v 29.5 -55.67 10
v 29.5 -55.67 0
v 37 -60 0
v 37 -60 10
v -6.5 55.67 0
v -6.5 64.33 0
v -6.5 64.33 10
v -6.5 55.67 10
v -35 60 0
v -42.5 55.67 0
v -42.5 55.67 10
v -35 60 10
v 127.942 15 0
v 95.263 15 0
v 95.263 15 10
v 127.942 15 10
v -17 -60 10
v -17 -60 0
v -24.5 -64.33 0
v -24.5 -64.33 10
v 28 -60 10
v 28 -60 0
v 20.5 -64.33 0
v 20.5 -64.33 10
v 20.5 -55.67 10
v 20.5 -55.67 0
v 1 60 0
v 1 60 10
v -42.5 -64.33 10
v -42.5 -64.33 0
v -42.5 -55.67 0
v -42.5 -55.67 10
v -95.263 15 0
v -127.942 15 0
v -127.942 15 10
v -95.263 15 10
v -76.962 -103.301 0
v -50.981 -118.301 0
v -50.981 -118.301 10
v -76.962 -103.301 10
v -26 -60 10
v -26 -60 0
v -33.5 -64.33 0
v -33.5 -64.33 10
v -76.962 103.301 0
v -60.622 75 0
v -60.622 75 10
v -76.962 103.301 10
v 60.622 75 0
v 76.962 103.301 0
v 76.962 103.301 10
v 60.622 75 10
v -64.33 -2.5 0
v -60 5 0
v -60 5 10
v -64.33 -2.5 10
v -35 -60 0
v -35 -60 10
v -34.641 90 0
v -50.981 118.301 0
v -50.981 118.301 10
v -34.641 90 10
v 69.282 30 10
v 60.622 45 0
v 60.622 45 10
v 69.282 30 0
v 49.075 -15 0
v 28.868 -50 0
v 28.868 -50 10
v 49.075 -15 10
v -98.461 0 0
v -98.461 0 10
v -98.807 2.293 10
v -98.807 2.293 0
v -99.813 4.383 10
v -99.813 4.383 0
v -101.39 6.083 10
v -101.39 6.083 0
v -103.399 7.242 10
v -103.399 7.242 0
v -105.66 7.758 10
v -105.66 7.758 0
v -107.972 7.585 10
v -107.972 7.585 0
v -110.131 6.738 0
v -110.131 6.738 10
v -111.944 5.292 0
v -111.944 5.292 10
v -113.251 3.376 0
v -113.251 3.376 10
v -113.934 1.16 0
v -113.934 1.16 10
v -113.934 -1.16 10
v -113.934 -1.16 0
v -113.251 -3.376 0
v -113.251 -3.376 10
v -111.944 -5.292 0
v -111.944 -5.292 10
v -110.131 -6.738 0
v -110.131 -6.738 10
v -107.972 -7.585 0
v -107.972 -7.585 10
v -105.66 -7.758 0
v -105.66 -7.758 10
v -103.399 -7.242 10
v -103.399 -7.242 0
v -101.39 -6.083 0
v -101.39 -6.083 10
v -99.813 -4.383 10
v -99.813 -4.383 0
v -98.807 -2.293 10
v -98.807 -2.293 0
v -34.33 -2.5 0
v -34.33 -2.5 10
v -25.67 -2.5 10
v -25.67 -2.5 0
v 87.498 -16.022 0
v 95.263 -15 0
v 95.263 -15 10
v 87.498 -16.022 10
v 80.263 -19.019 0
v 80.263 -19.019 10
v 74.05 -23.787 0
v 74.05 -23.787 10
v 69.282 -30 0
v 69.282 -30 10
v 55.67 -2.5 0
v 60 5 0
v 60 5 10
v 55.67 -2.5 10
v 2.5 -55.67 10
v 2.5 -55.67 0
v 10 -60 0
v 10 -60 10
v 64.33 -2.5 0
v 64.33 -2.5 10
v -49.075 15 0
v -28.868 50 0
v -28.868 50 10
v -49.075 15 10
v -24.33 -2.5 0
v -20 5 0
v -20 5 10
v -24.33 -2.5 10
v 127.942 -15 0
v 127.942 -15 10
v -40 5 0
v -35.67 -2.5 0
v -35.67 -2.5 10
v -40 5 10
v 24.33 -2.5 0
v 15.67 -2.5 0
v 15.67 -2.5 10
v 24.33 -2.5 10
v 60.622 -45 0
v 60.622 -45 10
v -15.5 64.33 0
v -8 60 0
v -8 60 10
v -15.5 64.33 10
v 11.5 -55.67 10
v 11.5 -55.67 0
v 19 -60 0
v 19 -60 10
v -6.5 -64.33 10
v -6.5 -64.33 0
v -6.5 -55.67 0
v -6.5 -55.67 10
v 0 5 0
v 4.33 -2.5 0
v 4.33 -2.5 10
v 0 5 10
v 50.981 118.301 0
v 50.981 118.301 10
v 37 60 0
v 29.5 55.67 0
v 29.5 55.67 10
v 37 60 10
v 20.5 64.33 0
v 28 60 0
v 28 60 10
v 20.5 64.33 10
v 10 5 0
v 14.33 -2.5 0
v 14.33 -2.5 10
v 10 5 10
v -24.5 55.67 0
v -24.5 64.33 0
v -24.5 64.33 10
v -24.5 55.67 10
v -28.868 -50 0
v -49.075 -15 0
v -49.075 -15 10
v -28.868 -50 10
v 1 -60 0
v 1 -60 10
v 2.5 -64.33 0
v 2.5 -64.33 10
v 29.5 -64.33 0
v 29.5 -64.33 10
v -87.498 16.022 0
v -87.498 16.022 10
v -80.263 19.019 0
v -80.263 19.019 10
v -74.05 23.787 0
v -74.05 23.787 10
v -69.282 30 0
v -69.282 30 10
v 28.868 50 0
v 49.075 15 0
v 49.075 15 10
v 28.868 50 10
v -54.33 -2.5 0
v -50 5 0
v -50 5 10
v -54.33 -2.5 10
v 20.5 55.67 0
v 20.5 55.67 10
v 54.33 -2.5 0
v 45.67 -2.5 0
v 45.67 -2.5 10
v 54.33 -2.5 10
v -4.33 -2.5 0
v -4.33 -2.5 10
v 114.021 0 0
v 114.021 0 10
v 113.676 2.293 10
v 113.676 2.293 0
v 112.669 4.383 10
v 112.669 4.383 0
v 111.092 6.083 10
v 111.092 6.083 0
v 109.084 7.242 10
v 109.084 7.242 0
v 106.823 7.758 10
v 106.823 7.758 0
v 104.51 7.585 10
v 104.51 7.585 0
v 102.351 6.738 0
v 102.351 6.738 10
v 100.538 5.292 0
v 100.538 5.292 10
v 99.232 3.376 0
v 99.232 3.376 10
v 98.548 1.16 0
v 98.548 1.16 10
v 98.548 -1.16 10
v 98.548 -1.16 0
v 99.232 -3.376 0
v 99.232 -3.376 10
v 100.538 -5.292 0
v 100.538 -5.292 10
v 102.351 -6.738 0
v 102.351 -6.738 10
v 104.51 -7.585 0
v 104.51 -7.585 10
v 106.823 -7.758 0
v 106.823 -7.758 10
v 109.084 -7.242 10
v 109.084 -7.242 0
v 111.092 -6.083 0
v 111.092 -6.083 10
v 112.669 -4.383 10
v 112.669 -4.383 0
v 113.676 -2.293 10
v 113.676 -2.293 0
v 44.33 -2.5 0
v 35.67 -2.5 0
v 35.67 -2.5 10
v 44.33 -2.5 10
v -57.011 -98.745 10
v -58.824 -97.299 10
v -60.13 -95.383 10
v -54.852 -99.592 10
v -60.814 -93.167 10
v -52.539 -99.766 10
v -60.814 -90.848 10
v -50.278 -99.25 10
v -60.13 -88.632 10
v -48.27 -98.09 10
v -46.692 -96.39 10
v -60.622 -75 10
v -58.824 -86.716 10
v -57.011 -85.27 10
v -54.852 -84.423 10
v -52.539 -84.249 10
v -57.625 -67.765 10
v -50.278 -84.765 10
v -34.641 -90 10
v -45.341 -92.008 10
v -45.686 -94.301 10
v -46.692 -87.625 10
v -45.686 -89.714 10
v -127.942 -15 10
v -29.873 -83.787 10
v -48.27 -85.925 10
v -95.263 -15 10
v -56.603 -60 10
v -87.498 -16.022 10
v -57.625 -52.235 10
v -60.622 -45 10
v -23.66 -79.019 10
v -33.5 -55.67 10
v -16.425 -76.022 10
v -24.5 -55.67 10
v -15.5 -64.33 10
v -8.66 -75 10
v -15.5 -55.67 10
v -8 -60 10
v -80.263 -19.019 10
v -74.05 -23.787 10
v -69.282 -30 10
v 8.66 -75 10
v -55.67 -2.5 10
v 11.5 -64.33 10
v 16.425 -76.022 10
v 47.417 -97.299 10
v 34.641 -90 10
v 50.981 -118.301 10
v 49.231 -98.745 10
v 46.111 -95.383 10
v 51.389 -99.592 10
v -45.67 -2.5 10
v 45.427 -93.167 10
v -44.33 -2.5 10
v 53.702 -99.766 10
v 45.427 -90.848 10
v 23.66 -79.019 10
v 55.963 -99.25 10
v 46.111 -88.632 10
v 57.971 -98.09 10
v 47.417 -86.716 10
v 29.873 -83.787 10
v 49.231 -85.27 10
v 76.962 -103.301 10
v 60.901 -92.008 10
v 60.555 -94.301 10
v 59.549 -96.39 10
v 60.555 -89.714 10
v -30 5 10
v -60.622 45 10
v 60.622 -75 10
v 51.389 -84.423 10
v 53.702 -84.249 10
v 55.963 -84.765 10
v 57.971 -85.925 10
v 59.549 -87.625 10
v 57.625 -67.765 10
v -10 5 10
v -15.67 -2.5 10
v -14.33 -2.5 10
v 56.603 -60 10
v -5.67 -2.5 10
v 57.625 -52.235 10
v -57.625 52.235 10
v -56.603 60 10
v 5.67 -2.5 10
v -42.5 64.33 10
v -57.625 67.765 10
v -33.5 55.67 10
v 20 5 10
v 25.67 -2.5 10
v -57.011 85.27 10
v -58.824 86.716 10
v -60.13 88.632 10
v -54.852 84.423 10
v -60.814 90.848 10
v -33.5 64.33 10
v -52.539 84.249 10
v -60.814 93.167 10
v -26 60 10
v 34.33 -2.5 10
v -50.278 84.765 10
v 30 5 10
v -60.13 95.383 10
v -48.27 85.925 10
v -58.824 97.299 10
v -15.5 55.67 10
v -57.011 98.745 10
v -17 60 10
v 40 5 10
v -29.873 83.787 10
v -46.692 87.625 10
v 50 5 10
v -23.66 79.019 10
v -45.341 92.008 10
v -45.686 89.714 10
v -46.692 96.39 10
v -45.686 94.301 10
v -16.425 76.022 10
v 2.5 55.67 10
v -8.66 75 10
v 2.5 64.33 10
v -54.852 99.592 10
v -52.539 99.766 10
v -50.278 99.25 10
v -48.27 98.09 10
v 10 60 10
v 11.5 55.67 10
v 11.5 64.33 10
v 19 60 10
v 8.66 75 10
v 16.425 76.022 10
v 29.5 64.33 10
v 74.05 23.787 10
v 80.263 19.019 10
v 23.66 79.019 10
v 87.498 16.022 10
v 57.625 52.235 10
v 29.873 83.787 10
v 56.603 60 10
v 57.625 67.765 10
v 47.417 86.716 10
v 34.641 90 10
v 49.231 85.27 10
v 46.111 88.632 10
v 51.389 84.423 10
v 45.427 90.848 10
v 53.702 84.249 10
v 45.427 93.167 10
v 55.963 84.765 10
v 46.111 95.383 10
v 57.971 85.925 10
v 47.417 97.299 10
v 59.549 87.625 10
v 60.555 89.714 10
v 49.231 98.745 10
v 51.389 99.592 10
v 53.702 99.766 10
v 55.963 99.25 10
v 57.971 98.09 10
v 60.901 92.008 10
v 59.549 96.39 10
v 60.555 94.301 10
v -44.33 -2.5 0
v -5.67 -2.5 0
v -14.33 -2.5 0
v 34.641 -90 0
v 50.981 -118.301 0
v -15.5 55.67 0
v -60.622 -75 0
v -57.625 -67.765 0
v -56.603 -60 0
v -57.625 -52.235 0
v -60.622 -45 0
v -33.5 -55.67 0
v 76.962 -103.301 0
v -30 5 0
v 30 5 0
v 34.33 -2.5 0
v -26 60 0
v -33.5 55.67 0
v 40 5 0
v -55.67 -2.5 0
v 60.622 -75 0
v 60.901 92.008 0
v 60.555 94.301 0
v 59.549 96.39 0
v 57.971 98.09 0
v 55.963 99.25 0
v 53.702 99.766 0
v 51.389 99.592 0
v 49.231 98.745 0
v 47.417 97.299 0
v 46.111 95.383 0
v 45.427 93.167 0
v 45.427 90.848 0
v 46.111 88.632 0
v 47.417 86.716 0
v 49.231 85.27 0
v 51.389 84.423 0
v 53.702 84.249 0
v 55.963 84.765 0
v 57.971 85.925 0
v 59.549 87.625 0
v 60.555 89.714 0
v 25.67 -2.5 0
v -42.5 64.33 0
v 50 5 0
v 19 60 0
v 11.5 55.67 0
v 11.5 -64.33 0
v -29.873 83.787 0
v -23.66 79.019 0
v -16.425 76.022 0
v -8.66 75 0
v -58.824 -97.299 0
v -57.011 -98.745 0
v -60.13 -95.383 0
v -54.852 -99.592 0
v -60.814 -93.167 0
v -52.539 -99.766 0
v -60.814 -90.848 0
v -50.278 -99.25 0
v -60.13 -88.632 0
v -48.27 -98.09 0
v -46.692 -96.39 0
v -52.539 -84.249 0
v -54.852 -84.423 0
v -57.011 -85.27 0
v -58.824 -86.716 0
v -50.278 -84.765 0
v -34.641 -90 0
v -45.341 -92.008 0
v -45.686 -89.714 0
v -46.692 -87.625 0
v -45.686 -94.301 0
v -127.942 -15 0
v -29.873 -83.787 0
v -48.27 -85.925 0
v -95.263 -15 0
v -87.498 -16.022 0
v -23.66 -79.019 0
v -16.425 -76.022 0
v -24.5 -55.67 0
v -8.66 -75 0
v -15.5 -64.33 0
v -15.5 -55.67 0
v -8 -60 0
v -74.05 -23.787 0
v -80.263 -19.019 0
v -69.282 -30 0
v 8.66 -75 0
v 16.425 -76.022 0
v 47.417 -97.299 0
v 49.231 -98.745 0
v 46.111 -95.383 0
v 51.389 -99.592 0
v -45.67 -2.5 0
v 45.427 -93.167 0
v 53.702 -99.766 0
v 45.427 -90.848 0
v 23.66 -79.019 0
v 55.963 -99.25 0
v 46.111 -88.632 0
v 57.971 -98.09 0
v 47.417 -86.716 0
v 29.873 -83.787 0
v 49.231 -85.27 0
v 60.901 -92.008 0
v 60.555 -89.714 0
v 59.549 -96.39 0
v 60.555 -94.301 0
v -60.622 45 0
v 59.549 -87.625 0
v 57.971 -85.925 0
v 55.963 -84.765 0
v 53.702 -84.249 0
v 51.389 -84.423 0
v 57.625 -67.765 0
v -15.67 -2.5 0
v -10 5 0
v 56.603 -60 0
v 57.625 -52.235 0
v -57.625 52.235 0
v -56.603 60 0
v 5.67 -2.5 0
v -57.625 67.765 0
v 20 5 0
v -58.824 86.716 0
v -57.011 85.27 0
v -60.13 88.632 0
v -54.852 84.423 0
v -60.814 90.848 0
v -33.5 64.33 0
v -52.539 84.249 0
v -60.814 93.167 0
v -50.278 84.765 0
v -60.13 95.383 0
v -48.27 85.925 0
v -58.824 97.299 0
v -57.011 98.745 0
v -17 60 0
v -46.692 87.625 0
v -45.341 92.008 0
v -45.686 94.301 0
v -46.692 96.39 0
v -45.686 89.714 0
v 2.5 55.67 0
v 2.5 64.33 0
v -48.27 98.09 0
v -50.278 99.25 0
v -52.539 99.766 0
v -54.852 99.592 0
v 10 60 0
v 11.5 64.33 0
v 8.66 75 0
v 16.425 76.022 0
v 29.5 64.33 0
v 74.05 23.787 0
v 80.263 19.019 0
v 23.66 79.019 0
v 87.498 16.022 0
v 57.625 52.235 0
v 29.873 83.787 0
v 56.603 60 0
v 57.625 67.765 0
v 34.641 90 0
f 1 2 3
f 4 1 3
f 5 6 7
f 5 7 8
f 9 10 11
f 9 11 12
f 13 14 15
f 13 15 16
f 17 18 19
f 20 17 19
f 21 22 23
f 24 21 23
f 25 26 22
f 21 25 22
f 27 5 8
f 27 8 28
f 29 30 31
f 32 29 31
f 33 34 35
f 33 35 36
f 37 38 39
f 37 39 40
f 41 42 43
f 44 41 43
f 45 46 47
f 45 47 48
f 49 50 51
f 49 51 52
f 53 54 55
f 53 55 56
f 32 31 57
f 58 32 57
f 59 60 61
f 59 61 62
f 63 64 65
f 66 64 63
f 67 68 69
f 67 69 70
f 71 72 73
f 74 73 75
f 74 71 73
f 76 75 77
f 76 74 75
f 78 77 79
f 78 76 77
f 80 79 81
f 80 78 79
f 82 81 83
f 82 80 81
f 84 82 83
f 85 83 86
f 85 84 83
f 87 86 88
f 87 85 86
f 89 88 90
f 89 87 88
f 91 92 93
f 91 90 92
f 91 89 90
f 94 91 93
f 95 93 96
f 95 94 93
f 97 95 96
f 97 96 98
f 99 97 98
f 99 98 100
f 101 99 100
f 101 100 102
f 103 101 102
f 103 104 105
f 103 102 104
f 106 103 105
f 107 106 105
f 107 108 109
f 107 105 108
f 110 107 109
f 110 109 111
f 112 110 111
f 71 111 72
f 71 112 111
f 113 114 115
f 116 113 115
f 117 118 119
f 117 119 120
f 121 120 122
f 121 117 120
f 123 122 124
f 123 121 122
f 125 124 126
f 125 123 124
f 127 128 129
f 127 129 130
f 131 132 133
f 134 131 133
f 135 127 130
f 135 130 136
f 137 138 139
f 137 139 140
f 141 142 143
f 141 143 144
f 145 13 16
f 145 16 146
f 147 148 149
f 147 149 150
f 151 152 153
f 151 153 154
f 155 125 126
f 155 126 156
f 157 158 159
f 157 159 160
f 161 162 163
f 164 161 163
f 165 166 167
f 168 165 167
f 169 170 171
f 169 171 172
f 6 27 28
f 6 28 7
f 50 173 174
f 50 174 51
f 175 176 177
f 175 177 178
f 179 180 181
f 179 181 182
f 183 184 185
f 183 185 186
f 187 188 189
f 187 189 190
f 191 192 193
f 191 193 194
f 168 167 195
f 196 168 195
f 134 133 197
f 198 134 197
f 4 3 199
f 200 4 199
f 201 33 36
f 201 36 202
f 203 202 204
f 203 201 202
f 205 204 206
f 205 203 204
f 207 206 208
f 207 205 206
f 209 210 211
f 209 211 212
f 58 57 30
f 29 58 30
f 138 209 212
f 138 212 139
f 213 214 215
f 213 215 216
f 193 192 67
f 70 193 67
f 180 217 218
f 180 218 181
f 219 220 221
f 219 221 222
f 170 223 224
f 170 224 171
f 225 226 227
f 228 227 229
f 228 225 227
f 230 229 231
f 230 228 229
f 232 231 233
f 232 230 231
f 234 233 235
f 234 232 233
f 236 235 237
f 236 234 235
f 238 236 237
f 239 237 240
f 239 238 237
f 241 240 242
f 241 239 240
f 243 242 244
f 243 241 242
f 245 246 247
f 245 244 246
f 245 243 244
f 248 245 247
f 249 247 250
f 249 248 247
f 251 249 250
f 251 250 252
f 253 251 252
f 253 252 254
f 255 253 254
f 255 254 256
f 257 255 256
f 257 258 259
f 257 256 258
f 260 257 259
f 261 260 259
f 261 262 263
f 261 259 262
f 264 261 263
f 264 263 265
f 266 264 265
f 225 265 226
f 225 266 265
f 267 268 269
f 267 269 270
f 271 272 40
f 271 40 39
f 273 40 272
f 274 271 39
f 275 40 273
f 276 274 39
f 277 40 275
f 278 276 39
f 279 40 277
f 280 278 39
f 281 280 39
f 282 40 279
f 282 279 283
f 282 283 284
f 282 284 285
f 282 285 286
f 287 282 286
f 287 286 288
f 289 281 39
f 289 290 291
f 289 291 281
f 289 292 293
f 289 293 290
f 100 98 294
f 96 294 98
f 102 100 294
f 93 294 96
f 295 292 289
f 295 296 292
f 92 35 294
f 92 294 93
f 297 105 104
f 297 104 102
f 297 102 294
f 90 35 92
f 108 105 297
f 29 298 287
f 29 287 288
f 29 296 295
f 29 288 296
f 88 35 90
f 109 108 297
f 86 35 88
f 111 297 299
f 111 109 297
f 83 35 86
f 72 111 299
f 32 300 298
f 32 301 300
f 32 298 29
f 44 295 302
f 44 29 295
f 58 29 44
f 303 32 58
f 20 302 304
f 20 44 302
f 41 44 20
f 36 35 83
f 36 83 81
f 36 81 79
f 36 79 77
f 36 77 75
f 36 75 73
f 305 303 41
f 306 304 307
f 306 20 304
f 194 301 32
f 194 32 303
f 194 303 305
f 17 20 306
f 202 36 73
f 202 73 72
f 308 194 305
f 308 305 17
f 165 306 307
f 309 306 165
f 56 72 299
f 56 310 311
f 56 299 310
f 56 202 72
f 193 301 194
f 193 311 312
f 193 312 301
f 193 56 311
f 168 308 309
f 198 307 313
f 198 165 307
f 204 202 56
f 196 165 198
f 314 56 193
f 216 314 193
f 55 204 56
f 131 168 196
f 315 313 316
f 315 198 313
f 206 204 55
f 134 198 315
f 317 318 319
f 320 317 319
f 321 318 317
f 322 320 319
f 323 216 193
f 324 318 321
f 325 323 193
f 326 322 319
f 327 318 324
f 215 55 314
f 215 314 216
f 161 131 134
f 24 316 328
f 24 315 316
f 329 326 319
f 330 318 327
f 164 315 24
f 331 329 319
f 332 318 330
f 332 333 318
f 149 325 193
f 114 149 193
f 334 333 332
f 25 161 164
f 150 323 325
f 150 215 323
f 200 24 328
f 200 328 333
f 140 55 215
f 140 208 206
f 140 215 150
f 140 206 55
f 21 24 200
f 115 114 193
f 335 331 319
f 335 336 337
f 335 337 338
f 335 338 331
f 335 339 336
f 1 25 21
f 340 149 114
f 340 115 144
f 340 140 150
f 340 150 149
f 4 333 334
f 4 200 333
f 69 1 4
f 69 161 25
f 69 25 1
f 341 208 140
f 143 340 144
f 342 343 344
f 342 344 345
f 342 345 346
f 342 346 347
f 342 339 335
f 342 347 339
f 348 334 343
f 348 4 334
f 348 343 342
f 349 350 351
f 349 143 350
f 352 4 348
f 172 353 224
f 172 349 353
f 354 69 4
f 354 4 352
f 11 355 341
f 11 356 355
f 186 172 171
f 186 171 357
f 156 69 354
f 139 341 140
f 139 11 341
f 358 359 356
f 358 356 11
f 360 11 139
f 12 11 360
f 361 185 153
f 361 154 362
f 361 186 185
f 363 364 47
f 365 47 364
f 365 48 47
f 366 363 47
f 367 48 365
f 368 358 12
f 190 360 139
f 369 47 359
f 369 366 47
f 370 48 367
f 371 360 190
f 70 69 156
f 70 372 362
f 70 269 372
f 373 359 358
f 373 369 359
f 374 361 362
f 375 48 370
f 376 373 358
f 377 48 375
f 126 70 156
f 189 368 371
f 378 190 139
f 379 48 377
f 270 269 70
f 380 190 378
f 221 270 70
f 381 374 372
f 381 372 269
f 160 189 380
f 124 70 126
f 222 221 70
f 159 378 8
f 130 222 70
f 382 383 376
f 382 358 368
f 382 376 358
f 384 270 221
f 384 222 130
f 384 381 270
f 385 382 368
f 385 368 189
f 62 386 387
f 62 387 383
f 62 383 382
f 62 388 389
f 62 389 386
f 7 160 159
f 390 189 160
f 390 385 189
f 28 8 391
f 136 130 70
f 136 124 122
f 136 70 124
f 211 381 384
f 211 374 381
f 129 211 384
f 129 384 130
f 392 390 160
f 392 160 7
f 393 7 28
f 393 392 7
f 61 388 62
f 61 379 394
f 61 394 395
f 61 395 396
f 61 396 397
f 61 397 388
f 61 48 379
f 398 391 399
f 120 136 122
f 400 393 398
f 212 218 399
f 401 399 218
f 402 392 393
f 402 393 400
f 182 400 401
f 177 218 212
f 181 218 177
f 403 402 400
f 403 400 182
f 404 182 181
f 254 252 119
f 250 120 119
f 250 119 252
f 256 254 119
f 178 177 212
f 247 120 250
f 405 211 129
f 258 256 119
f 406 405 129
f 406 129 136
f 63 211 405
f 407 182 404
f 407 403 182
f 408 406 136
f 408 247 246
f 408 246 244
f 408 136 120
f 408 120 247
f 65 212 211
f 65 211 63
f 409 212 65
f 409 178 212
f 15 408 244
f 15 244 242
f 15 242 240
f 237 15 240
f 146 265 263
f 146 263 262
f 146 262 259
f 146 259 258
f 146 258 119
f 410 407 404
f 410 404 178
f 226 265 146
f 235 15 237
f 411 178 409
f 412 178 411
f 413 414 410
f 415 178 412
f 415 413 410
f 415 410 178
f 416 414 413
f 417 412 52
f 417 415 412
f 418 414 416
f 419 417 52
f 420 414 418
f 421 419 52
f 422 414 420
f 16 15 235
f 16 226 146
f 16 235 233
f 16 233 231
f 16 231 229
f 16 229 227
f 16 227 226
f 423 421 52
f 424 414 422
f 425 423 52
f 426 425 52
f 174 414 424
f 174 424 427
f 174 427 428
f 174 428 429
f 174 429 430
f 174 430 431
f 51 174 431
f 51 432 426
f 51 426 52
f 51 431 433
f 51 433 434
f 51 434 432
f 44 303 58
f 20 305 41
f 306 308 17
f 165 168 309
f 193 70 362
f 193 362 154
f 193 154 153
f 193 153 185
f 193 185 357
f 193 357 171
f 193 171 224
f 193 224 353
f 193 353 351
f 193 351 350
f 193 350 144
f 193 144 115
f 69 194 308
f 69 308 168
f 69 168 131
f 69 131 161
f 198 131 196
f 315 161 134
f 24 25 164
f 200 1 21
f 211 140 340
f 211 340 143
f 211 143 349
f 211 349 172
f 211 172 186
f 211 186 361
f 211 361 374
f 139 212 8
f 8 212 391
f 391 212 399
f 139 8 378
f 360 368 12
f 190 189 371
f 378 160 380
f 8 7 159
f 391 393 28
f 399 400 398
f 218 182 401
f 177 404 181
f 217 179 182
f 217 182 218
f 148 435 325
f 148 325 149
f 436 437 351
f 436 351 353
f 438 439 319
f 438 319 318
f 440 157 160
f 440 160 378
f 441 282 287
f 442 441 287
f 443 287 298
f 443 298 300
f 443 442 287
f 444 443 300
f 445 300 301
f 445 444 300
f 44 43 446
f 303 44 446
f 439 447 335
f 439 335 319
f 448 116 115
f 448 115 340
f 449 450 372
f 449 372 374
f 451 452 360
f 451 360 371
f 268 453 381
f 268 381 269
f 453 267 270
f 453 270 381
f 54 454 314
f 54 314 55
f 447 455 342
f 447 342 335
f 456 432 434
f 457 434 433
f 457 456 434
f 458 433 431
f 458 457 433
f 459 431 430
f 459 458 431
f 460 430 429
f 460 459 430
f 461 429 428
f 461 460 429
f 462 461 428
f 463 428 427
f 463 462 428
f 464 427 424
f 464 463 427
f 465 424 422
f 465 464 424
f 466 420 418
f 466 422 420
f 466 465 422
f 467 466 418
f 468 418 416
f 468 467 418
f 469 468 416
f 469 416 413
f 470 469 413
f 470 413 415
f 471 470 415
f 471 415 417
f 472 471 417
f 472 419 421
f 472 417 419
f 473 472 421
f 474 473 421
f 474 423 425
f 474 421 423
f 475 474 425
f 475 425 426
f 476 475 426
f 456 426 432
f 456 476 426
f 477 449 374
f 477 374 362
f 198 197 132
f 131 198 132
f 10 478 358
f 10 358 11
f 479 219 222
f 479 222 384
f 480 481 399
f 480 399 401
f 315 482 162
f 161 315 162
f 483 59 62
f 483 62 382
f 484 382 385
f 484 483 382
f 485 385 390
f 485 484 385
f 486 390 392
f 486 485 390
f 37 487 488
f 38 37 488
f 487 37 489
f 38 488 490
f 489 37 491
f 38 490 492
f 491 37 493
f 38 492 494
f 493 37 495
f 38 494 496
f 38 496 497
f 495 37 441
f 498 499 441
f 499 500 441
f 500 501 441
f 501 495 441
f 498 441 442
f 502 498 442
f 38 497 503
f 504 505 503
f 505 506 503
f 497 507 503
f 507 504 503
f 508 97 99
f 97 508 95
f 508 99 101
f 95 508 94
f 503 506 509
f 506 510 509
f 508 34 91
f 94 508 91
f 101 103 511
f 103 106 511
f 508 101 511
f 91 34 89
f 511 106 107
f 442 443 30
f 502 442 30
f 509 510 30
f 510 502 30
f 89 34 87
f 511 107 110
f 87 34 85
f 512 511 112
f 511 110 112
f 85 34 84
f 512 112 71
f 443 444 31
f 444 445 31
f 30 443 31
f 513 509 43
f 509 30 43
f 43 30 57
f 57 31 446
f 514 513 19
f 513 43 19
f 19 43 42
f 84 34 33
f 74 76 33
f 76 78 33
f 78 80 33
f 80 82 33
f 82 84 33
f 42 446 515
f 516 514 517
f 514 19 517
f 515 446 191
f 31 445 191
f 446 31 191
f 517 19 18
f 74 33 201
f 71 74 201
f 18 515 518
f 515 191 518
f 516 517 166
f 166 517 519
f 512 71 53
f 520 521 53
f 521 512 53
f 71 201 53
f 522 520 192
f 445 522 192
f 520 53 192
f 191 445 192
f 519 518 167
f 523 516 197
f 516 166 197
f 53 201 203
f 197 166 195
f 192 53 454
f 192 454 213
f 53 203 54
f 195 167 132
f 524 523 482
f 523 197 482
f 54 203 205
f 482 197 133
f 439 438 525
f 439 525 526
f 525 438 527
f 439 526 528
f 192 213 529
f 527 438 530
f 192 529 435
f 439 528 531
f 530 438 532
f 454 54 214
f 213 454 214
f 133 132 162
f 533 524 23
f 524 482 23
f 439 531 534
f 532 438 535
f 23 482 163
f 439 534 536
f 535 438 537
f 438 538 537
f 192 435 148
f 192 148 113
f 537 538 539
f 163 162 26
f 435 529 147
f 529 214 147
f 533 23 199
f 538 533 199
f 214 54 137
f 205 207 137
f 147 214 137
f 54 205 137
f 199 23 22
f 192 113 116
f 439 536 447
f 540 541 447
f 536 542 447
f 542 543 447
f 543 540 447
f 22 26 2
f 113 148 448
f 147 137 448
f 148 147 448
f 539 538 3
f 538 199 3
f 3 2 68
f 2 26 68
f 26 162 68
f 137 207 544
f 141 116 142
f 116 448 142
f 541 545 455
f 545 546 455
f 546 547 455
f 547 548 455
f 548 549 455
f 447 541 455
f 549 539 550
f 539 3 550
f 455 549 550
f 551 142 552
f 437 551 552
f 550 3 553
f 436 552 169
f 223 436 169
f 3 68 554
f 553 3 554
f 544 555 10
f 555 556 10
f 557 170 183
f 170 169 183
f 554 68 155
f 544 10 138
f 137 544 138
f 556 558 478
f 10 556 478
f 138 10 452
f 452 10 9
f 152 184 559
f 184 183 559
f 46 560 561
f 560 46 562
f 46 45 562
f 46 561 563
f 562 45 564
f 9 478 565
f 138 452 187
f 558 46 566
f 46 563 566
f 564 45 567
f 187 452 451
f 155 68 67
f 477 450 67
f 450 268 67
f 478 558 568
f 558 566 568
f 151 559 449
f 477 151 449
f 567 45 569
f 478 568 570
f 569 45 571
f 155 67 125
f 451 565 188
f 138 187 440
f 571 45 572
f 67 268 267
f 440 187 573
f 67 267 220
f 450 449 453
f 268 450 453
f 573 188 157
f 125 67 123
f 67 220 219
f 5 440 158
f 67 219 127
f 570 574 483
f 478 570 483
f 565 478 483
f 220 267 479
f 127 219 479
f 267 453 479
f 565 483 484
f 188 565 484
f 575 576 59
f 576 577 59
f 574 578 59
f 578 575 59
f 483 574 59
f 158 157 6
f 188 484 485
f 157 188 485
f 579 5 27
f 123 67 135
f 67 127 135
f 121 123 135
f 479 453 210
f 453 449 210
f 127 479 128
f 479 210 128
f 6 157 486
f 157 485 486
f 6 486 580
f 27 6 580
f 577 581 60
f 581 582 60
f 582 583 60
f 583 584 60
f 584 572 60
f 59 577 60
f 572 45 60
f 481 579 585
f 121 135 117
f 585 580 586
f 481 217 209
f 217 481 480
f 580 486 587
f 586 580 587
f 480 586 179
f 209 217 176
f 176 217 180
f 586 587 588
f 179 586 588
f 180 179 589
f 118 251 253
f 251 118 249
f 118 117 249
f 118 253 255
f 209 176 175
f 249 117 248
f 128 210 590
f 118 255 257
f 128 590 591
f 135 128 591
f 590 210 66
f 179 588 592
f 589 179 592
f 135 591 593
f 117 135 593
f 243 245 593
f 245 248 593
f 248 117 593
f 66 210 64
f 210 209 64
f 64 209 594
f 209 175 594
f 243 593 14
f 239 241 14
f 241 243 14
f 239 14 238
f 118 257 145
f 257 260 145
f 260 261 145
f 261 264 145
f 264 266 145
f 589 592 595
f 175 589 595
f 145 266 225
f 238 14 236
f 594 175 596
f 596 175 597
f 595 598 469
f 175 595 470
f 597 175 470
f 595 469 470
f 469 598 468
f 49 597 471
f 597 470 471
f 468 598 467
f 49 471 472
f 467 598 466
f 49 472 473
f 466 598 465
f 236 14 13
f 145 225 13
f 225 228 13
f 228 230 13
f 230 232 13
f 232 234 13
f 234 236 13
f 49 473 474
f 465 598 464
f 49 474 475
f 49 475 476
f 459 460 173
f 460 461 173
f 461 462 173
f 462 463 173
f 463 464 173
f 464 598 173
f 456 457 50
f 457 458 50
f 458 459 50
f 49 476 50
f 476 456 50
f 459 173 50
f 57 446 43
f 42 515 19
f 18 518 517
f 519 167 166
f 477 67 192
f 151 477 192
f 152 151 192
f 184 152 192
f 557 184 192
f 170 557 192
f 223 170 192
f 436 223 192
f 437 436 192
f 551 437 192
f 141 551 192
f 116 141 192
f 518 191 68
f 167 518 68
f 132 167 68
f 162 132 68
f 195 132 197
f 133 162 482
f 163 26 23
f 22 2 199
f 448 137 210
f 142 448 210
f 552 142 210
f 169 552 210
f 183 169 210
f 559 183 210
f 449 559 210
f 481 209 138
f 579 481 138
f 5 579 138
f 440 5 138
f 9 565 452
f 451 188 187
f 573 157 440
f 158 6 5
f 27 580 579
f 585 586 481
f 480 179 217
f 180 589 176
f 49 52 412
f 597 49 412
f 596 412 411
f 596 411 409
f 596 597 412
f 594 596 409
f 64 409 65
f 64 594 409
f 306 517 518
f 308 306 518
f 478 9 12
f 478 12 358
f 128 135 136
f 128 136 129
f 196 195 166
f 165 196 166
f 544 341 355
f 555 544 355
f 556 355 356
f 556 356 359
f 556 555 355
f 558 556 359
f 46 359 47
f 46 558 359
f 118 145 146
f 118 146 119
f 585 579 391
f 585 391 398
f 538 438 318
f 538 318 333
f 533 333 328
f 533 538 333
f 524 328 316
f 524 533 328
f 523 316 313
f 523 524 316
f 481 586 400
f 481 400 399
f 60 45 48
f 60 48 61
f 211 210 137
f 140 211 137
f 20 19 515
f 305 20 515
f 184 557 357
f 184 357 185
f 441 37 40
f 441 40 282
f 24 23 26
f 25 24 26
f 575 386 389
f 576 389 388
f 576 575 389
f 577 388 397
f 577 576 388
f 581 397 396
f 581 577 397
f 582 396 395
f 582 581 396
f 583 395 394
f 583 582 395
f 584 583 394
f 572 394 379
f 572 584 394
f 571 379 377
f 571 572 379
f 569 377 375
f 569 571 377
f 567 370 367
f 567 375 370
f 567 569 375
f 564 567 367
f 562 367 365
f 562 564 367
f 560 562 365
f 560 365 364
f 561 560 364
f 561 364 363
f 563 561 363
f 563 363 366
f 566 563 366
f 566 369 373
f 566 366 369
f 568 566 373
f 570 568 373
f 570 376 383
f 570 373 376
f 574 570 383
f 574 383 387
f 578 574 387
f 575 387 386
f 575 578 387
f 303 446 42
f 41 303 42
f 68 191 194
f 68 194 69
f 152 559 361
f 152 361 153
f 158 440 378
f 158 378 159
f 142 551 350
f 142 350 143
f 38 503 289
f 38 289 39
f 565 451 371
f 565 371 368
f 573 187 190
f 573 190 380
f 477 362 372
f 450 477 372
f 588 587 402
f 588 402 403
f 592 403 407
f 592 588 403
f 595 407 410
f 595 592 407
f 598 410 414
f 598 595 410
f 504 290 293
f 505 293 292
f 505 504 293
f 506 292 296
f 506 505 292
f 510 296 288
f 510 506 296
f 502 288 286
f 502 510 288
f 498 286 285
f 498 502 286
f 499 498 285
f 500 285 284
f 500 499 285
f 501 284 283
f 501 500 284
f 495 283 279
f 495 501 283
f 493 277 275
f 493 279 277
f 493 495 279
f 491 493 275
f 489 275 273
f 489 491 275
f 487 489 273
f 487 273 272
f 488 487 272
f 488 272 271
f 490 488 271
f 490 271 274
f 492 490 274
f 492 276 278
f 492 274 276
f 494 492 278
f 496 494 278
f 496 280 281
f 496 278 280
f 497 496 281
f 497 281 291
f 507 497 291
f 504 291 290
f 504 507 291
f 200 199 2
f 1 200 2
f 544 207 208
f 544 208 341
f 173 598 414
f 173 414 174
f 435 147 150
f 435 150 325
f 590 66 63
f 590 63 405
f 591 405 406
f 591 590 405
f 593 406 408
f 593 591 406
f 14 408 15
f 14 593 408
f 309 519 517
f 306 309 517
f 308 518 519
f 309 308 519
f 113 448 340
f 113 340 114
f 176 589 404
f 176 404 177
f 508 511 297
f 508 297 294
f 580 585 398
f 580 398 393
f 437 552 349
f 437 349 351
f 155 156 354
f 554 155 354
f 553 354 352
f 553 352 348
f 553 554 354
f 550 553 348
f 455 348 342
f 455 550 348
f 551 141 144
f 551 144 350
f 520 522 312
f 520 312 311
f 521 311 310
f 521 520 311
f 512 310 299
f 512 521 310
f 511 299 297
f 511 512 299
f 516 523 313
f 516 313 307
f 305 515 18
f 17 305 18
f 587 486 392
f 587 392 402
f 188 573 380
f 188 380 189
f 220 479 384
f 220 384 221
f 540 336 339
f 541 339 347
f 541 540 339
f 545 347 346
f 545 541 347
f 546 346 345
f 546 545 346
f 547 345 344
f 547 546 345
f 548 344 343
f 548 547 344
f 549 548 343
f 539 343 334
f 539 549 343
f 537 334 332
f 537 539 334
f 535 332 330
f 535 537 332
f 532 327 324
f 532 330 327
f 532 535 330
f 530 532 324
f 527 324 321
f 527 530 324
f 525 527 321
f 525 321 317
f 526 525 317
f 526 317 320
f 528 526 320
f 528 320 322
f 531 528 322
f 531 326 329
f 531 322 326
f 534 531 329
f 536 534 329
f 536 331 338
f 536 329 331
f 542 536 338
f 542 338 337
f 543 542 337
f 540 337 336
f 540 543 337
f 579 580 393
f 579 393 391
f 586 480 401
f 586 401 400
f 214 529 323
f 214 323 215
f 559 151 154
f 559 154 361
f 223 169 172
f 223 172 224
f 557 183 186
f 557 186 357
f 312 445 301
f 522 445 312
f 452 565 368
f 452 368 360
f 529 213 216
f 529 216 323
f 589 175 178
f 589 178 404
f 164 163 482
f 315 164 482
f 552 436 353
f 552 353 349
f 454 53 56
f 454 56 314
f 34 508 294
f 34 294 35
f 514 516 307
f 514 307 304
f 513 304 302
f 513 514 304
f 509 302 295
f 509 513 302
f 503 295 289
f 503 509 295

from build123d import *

# Parameters (mm, degrees)
BOSS_EXTRUDE2_DEPTH = 10
SKETCH2_R           = 8
CUT_EXTRUDE1_DEPTH  = 17
CUT_EXTRUDE2_DEPTH  = 20
SKETCH4_R           = 8
SKETCH4_R_2         = 2.8
BOSS_EXTRUDE3_DEPTH = 10
SKETCH5_R           = 7.78
CUT_EXTRUDE3_DEPTH  = 19


with BuildPart() as part:
    # Sketch1 → Boss-Extrude2 (new body)
    # profile 1 of 2: a face of its own
    with BuildSketch(Plane.XY):
        with BuildLine():
            ThreePointArc((-60.621778265, 45), (-56.602540378, 60), (-60.621778265, 75))
            Line((-60.621778265, 75), (-76.961524227, 103.301270189))
            Line((-76.961524227, 103.301270189), (-50.980762114, 118.301270189))
            Line((-50.980762114, 118.301270189), (-34.641016151, 90))
            ThreePointArc((-34.641016151, 90), (-23.660254038, 79.019237886), (-8.660254038, 75))
            Line((-8.660254038, 75), (8.660254038, 75))
            ThreePointArc((8.660254038, 75), (23.660254038, 79.019237886), (34.641016151, 90))
            Line((34.641016151, 90), (50.980762114, 118.301270189))
            Line((50.980762114, 118.301270189), (76.961524227, 103.301270189))
            Line((76.961524227, 103.301270189), (60.621778265, 75))
            ThreePointArc((60.621778265, 75), (56.602540378, 60), (60.621778265, 45))
            Line((60.621778265, 45), (69.282032303, 30))
            ThreePointArc((69.282032303, 30), (80.262794416, 19.019237886), (95.262794416, 15))
            Line((95.262794416, 15), (127.942286341, 15))
            Line((127.942286341, 15), (127.942286341, -15))
            Line((127.942286341, -15), (95.262794416, -15))
            ThreePointArc((95.262794416, -15), (80.262794416, -19.019237886), (69.282032303, -30))
            Line((69.282032303, -30), (60.621778265, -45))
            ThreePointArc((60.621778265, -45), (56.602540378, -60), (60.621778265, -75))
            Line((60.621778265, -75), (76.961524227, -103.301270189))
            Line((76.961524227, -103.301270189), (50.980762114, -118.301270189))
            Line((50.980762114, -118.301270189), (34.641016151, -90))
            ThreePointArc((34.641016151, -90), (23.660254038, -79.019237886), (8.660254038, -75))
            Line((8.660254038, -75), (-8.660254038, -75))
            ThreePointArc((-8.660254038, -75), (-23.660254038, -79.019237886), (-34.641016151, -90))
            Line((-34.641016151, -90), (-50.980762114, -118.301270189))
            Line((-50.980762114, -118.301270189), (-76.961524227, -103.301270189))
            Line((-76.961524227, -103.301270189), (-60.621778265, -75))
            ThreePointArc((-60.621778265, -75), (-56.602540378, -60), (-60.621778265, -45))
            Line((-60.621778265, -45), (-69.282032303, -30))
            ThreePointArc((-69.282032303, -30), (-80.262794416, -19.019237886), (-95.262794416, -15))
            Line((-95.262794416, -15), (-127.942286341, -15))
            Line((-127.942286341, -15), (-127.942286341, 15))
            Line((-127.942286341, 15), (-95.262794416, 15))
            ThreePointArc((-95.262794416, 15), (-80.262794416, 19.019237886), (-69.282032303, 30))
            Line((-69.282032303, 30), (-60.621778265, 45))
        make_face()
        Polygon((28.867513459, -50), (57.735026919, 0), (28.867513459, 50), (-28.867513459, 50), (-57.735026919, 0), (-28.867513459, -50), align=None, mode=Mode.SUBTRACT)
    # profile 2 of 2: a face of its own
    with BuildSketch(Plane.XY):
        Polygon((49.074772881, 15), (-49.074772881, 15), (-57.735026919, 0), (-49.074772881, -15), (49.074772881, -15), (57.735026919, 0), align=None)
    extrude(amount=BOSS_EXTRUDE2_DEPTH)

    # Sketch2 → Cut-Extrude1 (cut)
    with BuildSketch(Plane.XY):
        with Locations((106.241169623, 0)):
            Circle(SKETCH2_R)
        with Locations((53.120584811, -92.007551821)):
            Circle(SKETCH2_R)
        with Locations((-53.120584811, -92.007551821)):
            Circle(SKETCH2_R)
        with Locations((-106.241169623, 0)):
            Circle(SKETCH2_R)
        with Locations((-53.120584811, 92.007551821)):
            Circle(SKETCH2_R)
        with Locations((53.120584811, 92.007551821)):
            Circle(SKETCH2_R)
    extrude(amount=CUT_EXTRUDE1_DEPTH, mode=Mode.SUBTRACT)

    # Sketch3 → Cut-Extrude2 (cut)
    with BuildSketch(Plane.XY):
        Polygon((-45.669872981, -2.5), (-50, 5), (-54.330127019, -2.5), align=None)
        Polygon((-55.669872981, -2.5), (-60, 5), (-64.330127019, -2.5), align=None)
        Polygon((-35.669872981, -2.5), (-40, 5), (-44.330127019, -2.5), align=None)
        Polygon((-25.669872981, -2.5), (-30, 5), (-34.330127019, -2.5), align=None)
        Polygon((-15.669872981, -2.5), (-20, 5), (-24.330127019, -2.5), align=None)
        Polygon((-5.669872981, -2.5), (-10, 5), (-14.330127019, -2.5), align=None)
        Polygon((4.330127019, -2.5), (0, 5), (-4.330127019, -2.5), align=None)
        Polygon((14.330127019, -2.5), (10, 5), (5.669872981, -2.5), align=None)
        Polygon((24.330127019, -2.5), (20, 5), (15.669872981, -2.5), align=None)
        Polygon((34.330127019, -2.5), (30, 5), (25.669872981, -2.5), align=None)
        Polygon((44.330127019, -2.5), (40, 5), (35.669872981, -2.5), align=None)
        Polygon((54.330127019, -2.5), (50, 5), (45.669872981, -2.5), align=None)
        Polygon((64.330127019, -2.5), (60, 5), (55.669872981, -2.5), align=None)
        Polygon((-26, 60), (-33.5, 64.330127019), (-33.5, 55.669872981), align=None)
        Polygon((-35, 60), (-42.5, 64.330127019), (-42.5, 55.669872981), align=None)
        Polygon((-17, 60), (-24.5, 64.330127019), (-24.5, 55.669872981), align=None)
        Polygon((-8, 60), (-15.5, 64.330127019), (-15.5, 55.669872981), align=None)
        Polygon((1, 60), (-6.5, 64.330127019), (-6.5, 55.669872981), align=None)
        Polygon((10, 60), (2.5, 64.330127019), (2.5, 55.669872981), align=None)
        Polygon((19, 60), (11.5, 64.330127019), (11.5, 55.669872981), align=None)
        Polygon((28, 60), (20.5, 64.330127019), (20.5, 55.669872981), align=None)
        Polygon((37, 60), (29.5, 64.330127019), (29.5, 55.669872981), align=None)
        Polygon((29.5, -55.669872981), (37, -60), (29.5, -64.330127019), align=None)
        Polygon((20.5, -55.669872981), (28, -60), (20.5, -64.330127019), align=None)
        Polygon((11.5, -55.669872981), (19, -60), (11.5, -64.330127019), align=None)
        Polygon((2.5, -55.669872981), (10, -60), (2.5, -64.330127019), align=None)
        Polygon((-6.5, -55.669872981), (1, -60), (-6.5, -64.330127019), align=None)
        Polygon((-15.5, -55.669872981), (-8, -60), (-15.5, -64.330127019), align=None)
        Polygon((-24.5, -55.669872981), (-17, -60), (-24.5, -64.330127019), align=None)
        Polygon((-33.5, -55.669872981), (-26, -60), (-33.5, -64.330127019), align=None)
        Polygon((-42.5, -55.669872981), (-35, -60), (-42.5, -64.330127019), align=None)
    extrude(amount=CUT_EXTRUDE2_DEPTH, mode=Mode.SUBTRACT)

    # Sketch4 → Boss-Extrude3 (add)
    # profile 1 of 6: a face of its own
    with BuildSketch(Plane.XY):
        with Locations((106.241169623, 0)):
            Circle(SKETCH4_R)
        with Locations((106.241169623, 0)):
            Circle(SKETCH4_R_2, mode=Mode.SUBTRACT)
    # profile 2 of 6: a face of its own
    with BuildSketch(Plane.XY):
        with Locations((53.120584811, -92.007551821)):
            Circle(SKETCH4_R)
        with Locations((53.120584811, -92.007551821)):
            Circle(SKETCH4_R_2, mode=Mode.SUBTRACT)
    # profile 3 of 6: a face of its own
    with BuildSketch(Plane.XY):
        with Locations((-53.120584811, -92.007551821)):
            Circle(SKETCH4_R)
        with Locations((-53.120584811, -92.007551821)):
            Circle(SKETCH4_R_2, mode=Mode.SUBTRACT)
    # profile 4 of 6: a face of its own
    with BuildSketch(Plane.XY):
        with Locations((-106.241169623, 0)):
            Circle(SKETCH4_R)
        with Locations((-106.241169623, 0)):
            Circle(SKETCH4_R_2, mode=Mode.SUBTRACT)
    # profile 5 of 6: a face of its own
    with BuildSketch(Plane.XY):
        with Locations((-53.120584811, 92.007551821)):
            Circle(SKETCH4_R)
        with Locations((-53.120584811, 92.007551821)):
            Circle(SKETCH4_R_2, mode=Mode.SUBTRACT)
    # profile 6 of 6: a face of its own
    with BuildSketch(Plane.XY):
        with Locations((53.120584811, 92.007551821)):
            Circle(SKETCH4_R)
        with Locations((53.120584811, 92.007551821)):
            Circle(SKETCH4_R_2, mode=Mode.SUBTRACT)
    extrude(amount=BOSS_EXTRUDE3_DEPTH)

    # Sketch5 → Cut-Extrude3 (cut)
    with BuildSketch(Plane.XY):
        with Locations((106.241169623, 0)):
            Circle(SKETCH5_R)
        with Locations((53.120584811, -92.007551821)):
            Circle(SKETCH5_R)
        with Locations((-53.120584811, -92.007551821)):
            Circle(SKETCH5_R)
        with Locations((-106.241169623, 0)):
            Circle(SKETCH5_R)
        with Locations((-53.120584811, 92.007551821)):
            Circle(SKETCH5_R)
        with Locations((53.120584811, 92.007551821)):
            Circle(SKETCH5_R)
    extrude(amount=CUT_EXTRUDE3_DEPTH, mode=Mode.SUBTRACT)


solid = part.part
